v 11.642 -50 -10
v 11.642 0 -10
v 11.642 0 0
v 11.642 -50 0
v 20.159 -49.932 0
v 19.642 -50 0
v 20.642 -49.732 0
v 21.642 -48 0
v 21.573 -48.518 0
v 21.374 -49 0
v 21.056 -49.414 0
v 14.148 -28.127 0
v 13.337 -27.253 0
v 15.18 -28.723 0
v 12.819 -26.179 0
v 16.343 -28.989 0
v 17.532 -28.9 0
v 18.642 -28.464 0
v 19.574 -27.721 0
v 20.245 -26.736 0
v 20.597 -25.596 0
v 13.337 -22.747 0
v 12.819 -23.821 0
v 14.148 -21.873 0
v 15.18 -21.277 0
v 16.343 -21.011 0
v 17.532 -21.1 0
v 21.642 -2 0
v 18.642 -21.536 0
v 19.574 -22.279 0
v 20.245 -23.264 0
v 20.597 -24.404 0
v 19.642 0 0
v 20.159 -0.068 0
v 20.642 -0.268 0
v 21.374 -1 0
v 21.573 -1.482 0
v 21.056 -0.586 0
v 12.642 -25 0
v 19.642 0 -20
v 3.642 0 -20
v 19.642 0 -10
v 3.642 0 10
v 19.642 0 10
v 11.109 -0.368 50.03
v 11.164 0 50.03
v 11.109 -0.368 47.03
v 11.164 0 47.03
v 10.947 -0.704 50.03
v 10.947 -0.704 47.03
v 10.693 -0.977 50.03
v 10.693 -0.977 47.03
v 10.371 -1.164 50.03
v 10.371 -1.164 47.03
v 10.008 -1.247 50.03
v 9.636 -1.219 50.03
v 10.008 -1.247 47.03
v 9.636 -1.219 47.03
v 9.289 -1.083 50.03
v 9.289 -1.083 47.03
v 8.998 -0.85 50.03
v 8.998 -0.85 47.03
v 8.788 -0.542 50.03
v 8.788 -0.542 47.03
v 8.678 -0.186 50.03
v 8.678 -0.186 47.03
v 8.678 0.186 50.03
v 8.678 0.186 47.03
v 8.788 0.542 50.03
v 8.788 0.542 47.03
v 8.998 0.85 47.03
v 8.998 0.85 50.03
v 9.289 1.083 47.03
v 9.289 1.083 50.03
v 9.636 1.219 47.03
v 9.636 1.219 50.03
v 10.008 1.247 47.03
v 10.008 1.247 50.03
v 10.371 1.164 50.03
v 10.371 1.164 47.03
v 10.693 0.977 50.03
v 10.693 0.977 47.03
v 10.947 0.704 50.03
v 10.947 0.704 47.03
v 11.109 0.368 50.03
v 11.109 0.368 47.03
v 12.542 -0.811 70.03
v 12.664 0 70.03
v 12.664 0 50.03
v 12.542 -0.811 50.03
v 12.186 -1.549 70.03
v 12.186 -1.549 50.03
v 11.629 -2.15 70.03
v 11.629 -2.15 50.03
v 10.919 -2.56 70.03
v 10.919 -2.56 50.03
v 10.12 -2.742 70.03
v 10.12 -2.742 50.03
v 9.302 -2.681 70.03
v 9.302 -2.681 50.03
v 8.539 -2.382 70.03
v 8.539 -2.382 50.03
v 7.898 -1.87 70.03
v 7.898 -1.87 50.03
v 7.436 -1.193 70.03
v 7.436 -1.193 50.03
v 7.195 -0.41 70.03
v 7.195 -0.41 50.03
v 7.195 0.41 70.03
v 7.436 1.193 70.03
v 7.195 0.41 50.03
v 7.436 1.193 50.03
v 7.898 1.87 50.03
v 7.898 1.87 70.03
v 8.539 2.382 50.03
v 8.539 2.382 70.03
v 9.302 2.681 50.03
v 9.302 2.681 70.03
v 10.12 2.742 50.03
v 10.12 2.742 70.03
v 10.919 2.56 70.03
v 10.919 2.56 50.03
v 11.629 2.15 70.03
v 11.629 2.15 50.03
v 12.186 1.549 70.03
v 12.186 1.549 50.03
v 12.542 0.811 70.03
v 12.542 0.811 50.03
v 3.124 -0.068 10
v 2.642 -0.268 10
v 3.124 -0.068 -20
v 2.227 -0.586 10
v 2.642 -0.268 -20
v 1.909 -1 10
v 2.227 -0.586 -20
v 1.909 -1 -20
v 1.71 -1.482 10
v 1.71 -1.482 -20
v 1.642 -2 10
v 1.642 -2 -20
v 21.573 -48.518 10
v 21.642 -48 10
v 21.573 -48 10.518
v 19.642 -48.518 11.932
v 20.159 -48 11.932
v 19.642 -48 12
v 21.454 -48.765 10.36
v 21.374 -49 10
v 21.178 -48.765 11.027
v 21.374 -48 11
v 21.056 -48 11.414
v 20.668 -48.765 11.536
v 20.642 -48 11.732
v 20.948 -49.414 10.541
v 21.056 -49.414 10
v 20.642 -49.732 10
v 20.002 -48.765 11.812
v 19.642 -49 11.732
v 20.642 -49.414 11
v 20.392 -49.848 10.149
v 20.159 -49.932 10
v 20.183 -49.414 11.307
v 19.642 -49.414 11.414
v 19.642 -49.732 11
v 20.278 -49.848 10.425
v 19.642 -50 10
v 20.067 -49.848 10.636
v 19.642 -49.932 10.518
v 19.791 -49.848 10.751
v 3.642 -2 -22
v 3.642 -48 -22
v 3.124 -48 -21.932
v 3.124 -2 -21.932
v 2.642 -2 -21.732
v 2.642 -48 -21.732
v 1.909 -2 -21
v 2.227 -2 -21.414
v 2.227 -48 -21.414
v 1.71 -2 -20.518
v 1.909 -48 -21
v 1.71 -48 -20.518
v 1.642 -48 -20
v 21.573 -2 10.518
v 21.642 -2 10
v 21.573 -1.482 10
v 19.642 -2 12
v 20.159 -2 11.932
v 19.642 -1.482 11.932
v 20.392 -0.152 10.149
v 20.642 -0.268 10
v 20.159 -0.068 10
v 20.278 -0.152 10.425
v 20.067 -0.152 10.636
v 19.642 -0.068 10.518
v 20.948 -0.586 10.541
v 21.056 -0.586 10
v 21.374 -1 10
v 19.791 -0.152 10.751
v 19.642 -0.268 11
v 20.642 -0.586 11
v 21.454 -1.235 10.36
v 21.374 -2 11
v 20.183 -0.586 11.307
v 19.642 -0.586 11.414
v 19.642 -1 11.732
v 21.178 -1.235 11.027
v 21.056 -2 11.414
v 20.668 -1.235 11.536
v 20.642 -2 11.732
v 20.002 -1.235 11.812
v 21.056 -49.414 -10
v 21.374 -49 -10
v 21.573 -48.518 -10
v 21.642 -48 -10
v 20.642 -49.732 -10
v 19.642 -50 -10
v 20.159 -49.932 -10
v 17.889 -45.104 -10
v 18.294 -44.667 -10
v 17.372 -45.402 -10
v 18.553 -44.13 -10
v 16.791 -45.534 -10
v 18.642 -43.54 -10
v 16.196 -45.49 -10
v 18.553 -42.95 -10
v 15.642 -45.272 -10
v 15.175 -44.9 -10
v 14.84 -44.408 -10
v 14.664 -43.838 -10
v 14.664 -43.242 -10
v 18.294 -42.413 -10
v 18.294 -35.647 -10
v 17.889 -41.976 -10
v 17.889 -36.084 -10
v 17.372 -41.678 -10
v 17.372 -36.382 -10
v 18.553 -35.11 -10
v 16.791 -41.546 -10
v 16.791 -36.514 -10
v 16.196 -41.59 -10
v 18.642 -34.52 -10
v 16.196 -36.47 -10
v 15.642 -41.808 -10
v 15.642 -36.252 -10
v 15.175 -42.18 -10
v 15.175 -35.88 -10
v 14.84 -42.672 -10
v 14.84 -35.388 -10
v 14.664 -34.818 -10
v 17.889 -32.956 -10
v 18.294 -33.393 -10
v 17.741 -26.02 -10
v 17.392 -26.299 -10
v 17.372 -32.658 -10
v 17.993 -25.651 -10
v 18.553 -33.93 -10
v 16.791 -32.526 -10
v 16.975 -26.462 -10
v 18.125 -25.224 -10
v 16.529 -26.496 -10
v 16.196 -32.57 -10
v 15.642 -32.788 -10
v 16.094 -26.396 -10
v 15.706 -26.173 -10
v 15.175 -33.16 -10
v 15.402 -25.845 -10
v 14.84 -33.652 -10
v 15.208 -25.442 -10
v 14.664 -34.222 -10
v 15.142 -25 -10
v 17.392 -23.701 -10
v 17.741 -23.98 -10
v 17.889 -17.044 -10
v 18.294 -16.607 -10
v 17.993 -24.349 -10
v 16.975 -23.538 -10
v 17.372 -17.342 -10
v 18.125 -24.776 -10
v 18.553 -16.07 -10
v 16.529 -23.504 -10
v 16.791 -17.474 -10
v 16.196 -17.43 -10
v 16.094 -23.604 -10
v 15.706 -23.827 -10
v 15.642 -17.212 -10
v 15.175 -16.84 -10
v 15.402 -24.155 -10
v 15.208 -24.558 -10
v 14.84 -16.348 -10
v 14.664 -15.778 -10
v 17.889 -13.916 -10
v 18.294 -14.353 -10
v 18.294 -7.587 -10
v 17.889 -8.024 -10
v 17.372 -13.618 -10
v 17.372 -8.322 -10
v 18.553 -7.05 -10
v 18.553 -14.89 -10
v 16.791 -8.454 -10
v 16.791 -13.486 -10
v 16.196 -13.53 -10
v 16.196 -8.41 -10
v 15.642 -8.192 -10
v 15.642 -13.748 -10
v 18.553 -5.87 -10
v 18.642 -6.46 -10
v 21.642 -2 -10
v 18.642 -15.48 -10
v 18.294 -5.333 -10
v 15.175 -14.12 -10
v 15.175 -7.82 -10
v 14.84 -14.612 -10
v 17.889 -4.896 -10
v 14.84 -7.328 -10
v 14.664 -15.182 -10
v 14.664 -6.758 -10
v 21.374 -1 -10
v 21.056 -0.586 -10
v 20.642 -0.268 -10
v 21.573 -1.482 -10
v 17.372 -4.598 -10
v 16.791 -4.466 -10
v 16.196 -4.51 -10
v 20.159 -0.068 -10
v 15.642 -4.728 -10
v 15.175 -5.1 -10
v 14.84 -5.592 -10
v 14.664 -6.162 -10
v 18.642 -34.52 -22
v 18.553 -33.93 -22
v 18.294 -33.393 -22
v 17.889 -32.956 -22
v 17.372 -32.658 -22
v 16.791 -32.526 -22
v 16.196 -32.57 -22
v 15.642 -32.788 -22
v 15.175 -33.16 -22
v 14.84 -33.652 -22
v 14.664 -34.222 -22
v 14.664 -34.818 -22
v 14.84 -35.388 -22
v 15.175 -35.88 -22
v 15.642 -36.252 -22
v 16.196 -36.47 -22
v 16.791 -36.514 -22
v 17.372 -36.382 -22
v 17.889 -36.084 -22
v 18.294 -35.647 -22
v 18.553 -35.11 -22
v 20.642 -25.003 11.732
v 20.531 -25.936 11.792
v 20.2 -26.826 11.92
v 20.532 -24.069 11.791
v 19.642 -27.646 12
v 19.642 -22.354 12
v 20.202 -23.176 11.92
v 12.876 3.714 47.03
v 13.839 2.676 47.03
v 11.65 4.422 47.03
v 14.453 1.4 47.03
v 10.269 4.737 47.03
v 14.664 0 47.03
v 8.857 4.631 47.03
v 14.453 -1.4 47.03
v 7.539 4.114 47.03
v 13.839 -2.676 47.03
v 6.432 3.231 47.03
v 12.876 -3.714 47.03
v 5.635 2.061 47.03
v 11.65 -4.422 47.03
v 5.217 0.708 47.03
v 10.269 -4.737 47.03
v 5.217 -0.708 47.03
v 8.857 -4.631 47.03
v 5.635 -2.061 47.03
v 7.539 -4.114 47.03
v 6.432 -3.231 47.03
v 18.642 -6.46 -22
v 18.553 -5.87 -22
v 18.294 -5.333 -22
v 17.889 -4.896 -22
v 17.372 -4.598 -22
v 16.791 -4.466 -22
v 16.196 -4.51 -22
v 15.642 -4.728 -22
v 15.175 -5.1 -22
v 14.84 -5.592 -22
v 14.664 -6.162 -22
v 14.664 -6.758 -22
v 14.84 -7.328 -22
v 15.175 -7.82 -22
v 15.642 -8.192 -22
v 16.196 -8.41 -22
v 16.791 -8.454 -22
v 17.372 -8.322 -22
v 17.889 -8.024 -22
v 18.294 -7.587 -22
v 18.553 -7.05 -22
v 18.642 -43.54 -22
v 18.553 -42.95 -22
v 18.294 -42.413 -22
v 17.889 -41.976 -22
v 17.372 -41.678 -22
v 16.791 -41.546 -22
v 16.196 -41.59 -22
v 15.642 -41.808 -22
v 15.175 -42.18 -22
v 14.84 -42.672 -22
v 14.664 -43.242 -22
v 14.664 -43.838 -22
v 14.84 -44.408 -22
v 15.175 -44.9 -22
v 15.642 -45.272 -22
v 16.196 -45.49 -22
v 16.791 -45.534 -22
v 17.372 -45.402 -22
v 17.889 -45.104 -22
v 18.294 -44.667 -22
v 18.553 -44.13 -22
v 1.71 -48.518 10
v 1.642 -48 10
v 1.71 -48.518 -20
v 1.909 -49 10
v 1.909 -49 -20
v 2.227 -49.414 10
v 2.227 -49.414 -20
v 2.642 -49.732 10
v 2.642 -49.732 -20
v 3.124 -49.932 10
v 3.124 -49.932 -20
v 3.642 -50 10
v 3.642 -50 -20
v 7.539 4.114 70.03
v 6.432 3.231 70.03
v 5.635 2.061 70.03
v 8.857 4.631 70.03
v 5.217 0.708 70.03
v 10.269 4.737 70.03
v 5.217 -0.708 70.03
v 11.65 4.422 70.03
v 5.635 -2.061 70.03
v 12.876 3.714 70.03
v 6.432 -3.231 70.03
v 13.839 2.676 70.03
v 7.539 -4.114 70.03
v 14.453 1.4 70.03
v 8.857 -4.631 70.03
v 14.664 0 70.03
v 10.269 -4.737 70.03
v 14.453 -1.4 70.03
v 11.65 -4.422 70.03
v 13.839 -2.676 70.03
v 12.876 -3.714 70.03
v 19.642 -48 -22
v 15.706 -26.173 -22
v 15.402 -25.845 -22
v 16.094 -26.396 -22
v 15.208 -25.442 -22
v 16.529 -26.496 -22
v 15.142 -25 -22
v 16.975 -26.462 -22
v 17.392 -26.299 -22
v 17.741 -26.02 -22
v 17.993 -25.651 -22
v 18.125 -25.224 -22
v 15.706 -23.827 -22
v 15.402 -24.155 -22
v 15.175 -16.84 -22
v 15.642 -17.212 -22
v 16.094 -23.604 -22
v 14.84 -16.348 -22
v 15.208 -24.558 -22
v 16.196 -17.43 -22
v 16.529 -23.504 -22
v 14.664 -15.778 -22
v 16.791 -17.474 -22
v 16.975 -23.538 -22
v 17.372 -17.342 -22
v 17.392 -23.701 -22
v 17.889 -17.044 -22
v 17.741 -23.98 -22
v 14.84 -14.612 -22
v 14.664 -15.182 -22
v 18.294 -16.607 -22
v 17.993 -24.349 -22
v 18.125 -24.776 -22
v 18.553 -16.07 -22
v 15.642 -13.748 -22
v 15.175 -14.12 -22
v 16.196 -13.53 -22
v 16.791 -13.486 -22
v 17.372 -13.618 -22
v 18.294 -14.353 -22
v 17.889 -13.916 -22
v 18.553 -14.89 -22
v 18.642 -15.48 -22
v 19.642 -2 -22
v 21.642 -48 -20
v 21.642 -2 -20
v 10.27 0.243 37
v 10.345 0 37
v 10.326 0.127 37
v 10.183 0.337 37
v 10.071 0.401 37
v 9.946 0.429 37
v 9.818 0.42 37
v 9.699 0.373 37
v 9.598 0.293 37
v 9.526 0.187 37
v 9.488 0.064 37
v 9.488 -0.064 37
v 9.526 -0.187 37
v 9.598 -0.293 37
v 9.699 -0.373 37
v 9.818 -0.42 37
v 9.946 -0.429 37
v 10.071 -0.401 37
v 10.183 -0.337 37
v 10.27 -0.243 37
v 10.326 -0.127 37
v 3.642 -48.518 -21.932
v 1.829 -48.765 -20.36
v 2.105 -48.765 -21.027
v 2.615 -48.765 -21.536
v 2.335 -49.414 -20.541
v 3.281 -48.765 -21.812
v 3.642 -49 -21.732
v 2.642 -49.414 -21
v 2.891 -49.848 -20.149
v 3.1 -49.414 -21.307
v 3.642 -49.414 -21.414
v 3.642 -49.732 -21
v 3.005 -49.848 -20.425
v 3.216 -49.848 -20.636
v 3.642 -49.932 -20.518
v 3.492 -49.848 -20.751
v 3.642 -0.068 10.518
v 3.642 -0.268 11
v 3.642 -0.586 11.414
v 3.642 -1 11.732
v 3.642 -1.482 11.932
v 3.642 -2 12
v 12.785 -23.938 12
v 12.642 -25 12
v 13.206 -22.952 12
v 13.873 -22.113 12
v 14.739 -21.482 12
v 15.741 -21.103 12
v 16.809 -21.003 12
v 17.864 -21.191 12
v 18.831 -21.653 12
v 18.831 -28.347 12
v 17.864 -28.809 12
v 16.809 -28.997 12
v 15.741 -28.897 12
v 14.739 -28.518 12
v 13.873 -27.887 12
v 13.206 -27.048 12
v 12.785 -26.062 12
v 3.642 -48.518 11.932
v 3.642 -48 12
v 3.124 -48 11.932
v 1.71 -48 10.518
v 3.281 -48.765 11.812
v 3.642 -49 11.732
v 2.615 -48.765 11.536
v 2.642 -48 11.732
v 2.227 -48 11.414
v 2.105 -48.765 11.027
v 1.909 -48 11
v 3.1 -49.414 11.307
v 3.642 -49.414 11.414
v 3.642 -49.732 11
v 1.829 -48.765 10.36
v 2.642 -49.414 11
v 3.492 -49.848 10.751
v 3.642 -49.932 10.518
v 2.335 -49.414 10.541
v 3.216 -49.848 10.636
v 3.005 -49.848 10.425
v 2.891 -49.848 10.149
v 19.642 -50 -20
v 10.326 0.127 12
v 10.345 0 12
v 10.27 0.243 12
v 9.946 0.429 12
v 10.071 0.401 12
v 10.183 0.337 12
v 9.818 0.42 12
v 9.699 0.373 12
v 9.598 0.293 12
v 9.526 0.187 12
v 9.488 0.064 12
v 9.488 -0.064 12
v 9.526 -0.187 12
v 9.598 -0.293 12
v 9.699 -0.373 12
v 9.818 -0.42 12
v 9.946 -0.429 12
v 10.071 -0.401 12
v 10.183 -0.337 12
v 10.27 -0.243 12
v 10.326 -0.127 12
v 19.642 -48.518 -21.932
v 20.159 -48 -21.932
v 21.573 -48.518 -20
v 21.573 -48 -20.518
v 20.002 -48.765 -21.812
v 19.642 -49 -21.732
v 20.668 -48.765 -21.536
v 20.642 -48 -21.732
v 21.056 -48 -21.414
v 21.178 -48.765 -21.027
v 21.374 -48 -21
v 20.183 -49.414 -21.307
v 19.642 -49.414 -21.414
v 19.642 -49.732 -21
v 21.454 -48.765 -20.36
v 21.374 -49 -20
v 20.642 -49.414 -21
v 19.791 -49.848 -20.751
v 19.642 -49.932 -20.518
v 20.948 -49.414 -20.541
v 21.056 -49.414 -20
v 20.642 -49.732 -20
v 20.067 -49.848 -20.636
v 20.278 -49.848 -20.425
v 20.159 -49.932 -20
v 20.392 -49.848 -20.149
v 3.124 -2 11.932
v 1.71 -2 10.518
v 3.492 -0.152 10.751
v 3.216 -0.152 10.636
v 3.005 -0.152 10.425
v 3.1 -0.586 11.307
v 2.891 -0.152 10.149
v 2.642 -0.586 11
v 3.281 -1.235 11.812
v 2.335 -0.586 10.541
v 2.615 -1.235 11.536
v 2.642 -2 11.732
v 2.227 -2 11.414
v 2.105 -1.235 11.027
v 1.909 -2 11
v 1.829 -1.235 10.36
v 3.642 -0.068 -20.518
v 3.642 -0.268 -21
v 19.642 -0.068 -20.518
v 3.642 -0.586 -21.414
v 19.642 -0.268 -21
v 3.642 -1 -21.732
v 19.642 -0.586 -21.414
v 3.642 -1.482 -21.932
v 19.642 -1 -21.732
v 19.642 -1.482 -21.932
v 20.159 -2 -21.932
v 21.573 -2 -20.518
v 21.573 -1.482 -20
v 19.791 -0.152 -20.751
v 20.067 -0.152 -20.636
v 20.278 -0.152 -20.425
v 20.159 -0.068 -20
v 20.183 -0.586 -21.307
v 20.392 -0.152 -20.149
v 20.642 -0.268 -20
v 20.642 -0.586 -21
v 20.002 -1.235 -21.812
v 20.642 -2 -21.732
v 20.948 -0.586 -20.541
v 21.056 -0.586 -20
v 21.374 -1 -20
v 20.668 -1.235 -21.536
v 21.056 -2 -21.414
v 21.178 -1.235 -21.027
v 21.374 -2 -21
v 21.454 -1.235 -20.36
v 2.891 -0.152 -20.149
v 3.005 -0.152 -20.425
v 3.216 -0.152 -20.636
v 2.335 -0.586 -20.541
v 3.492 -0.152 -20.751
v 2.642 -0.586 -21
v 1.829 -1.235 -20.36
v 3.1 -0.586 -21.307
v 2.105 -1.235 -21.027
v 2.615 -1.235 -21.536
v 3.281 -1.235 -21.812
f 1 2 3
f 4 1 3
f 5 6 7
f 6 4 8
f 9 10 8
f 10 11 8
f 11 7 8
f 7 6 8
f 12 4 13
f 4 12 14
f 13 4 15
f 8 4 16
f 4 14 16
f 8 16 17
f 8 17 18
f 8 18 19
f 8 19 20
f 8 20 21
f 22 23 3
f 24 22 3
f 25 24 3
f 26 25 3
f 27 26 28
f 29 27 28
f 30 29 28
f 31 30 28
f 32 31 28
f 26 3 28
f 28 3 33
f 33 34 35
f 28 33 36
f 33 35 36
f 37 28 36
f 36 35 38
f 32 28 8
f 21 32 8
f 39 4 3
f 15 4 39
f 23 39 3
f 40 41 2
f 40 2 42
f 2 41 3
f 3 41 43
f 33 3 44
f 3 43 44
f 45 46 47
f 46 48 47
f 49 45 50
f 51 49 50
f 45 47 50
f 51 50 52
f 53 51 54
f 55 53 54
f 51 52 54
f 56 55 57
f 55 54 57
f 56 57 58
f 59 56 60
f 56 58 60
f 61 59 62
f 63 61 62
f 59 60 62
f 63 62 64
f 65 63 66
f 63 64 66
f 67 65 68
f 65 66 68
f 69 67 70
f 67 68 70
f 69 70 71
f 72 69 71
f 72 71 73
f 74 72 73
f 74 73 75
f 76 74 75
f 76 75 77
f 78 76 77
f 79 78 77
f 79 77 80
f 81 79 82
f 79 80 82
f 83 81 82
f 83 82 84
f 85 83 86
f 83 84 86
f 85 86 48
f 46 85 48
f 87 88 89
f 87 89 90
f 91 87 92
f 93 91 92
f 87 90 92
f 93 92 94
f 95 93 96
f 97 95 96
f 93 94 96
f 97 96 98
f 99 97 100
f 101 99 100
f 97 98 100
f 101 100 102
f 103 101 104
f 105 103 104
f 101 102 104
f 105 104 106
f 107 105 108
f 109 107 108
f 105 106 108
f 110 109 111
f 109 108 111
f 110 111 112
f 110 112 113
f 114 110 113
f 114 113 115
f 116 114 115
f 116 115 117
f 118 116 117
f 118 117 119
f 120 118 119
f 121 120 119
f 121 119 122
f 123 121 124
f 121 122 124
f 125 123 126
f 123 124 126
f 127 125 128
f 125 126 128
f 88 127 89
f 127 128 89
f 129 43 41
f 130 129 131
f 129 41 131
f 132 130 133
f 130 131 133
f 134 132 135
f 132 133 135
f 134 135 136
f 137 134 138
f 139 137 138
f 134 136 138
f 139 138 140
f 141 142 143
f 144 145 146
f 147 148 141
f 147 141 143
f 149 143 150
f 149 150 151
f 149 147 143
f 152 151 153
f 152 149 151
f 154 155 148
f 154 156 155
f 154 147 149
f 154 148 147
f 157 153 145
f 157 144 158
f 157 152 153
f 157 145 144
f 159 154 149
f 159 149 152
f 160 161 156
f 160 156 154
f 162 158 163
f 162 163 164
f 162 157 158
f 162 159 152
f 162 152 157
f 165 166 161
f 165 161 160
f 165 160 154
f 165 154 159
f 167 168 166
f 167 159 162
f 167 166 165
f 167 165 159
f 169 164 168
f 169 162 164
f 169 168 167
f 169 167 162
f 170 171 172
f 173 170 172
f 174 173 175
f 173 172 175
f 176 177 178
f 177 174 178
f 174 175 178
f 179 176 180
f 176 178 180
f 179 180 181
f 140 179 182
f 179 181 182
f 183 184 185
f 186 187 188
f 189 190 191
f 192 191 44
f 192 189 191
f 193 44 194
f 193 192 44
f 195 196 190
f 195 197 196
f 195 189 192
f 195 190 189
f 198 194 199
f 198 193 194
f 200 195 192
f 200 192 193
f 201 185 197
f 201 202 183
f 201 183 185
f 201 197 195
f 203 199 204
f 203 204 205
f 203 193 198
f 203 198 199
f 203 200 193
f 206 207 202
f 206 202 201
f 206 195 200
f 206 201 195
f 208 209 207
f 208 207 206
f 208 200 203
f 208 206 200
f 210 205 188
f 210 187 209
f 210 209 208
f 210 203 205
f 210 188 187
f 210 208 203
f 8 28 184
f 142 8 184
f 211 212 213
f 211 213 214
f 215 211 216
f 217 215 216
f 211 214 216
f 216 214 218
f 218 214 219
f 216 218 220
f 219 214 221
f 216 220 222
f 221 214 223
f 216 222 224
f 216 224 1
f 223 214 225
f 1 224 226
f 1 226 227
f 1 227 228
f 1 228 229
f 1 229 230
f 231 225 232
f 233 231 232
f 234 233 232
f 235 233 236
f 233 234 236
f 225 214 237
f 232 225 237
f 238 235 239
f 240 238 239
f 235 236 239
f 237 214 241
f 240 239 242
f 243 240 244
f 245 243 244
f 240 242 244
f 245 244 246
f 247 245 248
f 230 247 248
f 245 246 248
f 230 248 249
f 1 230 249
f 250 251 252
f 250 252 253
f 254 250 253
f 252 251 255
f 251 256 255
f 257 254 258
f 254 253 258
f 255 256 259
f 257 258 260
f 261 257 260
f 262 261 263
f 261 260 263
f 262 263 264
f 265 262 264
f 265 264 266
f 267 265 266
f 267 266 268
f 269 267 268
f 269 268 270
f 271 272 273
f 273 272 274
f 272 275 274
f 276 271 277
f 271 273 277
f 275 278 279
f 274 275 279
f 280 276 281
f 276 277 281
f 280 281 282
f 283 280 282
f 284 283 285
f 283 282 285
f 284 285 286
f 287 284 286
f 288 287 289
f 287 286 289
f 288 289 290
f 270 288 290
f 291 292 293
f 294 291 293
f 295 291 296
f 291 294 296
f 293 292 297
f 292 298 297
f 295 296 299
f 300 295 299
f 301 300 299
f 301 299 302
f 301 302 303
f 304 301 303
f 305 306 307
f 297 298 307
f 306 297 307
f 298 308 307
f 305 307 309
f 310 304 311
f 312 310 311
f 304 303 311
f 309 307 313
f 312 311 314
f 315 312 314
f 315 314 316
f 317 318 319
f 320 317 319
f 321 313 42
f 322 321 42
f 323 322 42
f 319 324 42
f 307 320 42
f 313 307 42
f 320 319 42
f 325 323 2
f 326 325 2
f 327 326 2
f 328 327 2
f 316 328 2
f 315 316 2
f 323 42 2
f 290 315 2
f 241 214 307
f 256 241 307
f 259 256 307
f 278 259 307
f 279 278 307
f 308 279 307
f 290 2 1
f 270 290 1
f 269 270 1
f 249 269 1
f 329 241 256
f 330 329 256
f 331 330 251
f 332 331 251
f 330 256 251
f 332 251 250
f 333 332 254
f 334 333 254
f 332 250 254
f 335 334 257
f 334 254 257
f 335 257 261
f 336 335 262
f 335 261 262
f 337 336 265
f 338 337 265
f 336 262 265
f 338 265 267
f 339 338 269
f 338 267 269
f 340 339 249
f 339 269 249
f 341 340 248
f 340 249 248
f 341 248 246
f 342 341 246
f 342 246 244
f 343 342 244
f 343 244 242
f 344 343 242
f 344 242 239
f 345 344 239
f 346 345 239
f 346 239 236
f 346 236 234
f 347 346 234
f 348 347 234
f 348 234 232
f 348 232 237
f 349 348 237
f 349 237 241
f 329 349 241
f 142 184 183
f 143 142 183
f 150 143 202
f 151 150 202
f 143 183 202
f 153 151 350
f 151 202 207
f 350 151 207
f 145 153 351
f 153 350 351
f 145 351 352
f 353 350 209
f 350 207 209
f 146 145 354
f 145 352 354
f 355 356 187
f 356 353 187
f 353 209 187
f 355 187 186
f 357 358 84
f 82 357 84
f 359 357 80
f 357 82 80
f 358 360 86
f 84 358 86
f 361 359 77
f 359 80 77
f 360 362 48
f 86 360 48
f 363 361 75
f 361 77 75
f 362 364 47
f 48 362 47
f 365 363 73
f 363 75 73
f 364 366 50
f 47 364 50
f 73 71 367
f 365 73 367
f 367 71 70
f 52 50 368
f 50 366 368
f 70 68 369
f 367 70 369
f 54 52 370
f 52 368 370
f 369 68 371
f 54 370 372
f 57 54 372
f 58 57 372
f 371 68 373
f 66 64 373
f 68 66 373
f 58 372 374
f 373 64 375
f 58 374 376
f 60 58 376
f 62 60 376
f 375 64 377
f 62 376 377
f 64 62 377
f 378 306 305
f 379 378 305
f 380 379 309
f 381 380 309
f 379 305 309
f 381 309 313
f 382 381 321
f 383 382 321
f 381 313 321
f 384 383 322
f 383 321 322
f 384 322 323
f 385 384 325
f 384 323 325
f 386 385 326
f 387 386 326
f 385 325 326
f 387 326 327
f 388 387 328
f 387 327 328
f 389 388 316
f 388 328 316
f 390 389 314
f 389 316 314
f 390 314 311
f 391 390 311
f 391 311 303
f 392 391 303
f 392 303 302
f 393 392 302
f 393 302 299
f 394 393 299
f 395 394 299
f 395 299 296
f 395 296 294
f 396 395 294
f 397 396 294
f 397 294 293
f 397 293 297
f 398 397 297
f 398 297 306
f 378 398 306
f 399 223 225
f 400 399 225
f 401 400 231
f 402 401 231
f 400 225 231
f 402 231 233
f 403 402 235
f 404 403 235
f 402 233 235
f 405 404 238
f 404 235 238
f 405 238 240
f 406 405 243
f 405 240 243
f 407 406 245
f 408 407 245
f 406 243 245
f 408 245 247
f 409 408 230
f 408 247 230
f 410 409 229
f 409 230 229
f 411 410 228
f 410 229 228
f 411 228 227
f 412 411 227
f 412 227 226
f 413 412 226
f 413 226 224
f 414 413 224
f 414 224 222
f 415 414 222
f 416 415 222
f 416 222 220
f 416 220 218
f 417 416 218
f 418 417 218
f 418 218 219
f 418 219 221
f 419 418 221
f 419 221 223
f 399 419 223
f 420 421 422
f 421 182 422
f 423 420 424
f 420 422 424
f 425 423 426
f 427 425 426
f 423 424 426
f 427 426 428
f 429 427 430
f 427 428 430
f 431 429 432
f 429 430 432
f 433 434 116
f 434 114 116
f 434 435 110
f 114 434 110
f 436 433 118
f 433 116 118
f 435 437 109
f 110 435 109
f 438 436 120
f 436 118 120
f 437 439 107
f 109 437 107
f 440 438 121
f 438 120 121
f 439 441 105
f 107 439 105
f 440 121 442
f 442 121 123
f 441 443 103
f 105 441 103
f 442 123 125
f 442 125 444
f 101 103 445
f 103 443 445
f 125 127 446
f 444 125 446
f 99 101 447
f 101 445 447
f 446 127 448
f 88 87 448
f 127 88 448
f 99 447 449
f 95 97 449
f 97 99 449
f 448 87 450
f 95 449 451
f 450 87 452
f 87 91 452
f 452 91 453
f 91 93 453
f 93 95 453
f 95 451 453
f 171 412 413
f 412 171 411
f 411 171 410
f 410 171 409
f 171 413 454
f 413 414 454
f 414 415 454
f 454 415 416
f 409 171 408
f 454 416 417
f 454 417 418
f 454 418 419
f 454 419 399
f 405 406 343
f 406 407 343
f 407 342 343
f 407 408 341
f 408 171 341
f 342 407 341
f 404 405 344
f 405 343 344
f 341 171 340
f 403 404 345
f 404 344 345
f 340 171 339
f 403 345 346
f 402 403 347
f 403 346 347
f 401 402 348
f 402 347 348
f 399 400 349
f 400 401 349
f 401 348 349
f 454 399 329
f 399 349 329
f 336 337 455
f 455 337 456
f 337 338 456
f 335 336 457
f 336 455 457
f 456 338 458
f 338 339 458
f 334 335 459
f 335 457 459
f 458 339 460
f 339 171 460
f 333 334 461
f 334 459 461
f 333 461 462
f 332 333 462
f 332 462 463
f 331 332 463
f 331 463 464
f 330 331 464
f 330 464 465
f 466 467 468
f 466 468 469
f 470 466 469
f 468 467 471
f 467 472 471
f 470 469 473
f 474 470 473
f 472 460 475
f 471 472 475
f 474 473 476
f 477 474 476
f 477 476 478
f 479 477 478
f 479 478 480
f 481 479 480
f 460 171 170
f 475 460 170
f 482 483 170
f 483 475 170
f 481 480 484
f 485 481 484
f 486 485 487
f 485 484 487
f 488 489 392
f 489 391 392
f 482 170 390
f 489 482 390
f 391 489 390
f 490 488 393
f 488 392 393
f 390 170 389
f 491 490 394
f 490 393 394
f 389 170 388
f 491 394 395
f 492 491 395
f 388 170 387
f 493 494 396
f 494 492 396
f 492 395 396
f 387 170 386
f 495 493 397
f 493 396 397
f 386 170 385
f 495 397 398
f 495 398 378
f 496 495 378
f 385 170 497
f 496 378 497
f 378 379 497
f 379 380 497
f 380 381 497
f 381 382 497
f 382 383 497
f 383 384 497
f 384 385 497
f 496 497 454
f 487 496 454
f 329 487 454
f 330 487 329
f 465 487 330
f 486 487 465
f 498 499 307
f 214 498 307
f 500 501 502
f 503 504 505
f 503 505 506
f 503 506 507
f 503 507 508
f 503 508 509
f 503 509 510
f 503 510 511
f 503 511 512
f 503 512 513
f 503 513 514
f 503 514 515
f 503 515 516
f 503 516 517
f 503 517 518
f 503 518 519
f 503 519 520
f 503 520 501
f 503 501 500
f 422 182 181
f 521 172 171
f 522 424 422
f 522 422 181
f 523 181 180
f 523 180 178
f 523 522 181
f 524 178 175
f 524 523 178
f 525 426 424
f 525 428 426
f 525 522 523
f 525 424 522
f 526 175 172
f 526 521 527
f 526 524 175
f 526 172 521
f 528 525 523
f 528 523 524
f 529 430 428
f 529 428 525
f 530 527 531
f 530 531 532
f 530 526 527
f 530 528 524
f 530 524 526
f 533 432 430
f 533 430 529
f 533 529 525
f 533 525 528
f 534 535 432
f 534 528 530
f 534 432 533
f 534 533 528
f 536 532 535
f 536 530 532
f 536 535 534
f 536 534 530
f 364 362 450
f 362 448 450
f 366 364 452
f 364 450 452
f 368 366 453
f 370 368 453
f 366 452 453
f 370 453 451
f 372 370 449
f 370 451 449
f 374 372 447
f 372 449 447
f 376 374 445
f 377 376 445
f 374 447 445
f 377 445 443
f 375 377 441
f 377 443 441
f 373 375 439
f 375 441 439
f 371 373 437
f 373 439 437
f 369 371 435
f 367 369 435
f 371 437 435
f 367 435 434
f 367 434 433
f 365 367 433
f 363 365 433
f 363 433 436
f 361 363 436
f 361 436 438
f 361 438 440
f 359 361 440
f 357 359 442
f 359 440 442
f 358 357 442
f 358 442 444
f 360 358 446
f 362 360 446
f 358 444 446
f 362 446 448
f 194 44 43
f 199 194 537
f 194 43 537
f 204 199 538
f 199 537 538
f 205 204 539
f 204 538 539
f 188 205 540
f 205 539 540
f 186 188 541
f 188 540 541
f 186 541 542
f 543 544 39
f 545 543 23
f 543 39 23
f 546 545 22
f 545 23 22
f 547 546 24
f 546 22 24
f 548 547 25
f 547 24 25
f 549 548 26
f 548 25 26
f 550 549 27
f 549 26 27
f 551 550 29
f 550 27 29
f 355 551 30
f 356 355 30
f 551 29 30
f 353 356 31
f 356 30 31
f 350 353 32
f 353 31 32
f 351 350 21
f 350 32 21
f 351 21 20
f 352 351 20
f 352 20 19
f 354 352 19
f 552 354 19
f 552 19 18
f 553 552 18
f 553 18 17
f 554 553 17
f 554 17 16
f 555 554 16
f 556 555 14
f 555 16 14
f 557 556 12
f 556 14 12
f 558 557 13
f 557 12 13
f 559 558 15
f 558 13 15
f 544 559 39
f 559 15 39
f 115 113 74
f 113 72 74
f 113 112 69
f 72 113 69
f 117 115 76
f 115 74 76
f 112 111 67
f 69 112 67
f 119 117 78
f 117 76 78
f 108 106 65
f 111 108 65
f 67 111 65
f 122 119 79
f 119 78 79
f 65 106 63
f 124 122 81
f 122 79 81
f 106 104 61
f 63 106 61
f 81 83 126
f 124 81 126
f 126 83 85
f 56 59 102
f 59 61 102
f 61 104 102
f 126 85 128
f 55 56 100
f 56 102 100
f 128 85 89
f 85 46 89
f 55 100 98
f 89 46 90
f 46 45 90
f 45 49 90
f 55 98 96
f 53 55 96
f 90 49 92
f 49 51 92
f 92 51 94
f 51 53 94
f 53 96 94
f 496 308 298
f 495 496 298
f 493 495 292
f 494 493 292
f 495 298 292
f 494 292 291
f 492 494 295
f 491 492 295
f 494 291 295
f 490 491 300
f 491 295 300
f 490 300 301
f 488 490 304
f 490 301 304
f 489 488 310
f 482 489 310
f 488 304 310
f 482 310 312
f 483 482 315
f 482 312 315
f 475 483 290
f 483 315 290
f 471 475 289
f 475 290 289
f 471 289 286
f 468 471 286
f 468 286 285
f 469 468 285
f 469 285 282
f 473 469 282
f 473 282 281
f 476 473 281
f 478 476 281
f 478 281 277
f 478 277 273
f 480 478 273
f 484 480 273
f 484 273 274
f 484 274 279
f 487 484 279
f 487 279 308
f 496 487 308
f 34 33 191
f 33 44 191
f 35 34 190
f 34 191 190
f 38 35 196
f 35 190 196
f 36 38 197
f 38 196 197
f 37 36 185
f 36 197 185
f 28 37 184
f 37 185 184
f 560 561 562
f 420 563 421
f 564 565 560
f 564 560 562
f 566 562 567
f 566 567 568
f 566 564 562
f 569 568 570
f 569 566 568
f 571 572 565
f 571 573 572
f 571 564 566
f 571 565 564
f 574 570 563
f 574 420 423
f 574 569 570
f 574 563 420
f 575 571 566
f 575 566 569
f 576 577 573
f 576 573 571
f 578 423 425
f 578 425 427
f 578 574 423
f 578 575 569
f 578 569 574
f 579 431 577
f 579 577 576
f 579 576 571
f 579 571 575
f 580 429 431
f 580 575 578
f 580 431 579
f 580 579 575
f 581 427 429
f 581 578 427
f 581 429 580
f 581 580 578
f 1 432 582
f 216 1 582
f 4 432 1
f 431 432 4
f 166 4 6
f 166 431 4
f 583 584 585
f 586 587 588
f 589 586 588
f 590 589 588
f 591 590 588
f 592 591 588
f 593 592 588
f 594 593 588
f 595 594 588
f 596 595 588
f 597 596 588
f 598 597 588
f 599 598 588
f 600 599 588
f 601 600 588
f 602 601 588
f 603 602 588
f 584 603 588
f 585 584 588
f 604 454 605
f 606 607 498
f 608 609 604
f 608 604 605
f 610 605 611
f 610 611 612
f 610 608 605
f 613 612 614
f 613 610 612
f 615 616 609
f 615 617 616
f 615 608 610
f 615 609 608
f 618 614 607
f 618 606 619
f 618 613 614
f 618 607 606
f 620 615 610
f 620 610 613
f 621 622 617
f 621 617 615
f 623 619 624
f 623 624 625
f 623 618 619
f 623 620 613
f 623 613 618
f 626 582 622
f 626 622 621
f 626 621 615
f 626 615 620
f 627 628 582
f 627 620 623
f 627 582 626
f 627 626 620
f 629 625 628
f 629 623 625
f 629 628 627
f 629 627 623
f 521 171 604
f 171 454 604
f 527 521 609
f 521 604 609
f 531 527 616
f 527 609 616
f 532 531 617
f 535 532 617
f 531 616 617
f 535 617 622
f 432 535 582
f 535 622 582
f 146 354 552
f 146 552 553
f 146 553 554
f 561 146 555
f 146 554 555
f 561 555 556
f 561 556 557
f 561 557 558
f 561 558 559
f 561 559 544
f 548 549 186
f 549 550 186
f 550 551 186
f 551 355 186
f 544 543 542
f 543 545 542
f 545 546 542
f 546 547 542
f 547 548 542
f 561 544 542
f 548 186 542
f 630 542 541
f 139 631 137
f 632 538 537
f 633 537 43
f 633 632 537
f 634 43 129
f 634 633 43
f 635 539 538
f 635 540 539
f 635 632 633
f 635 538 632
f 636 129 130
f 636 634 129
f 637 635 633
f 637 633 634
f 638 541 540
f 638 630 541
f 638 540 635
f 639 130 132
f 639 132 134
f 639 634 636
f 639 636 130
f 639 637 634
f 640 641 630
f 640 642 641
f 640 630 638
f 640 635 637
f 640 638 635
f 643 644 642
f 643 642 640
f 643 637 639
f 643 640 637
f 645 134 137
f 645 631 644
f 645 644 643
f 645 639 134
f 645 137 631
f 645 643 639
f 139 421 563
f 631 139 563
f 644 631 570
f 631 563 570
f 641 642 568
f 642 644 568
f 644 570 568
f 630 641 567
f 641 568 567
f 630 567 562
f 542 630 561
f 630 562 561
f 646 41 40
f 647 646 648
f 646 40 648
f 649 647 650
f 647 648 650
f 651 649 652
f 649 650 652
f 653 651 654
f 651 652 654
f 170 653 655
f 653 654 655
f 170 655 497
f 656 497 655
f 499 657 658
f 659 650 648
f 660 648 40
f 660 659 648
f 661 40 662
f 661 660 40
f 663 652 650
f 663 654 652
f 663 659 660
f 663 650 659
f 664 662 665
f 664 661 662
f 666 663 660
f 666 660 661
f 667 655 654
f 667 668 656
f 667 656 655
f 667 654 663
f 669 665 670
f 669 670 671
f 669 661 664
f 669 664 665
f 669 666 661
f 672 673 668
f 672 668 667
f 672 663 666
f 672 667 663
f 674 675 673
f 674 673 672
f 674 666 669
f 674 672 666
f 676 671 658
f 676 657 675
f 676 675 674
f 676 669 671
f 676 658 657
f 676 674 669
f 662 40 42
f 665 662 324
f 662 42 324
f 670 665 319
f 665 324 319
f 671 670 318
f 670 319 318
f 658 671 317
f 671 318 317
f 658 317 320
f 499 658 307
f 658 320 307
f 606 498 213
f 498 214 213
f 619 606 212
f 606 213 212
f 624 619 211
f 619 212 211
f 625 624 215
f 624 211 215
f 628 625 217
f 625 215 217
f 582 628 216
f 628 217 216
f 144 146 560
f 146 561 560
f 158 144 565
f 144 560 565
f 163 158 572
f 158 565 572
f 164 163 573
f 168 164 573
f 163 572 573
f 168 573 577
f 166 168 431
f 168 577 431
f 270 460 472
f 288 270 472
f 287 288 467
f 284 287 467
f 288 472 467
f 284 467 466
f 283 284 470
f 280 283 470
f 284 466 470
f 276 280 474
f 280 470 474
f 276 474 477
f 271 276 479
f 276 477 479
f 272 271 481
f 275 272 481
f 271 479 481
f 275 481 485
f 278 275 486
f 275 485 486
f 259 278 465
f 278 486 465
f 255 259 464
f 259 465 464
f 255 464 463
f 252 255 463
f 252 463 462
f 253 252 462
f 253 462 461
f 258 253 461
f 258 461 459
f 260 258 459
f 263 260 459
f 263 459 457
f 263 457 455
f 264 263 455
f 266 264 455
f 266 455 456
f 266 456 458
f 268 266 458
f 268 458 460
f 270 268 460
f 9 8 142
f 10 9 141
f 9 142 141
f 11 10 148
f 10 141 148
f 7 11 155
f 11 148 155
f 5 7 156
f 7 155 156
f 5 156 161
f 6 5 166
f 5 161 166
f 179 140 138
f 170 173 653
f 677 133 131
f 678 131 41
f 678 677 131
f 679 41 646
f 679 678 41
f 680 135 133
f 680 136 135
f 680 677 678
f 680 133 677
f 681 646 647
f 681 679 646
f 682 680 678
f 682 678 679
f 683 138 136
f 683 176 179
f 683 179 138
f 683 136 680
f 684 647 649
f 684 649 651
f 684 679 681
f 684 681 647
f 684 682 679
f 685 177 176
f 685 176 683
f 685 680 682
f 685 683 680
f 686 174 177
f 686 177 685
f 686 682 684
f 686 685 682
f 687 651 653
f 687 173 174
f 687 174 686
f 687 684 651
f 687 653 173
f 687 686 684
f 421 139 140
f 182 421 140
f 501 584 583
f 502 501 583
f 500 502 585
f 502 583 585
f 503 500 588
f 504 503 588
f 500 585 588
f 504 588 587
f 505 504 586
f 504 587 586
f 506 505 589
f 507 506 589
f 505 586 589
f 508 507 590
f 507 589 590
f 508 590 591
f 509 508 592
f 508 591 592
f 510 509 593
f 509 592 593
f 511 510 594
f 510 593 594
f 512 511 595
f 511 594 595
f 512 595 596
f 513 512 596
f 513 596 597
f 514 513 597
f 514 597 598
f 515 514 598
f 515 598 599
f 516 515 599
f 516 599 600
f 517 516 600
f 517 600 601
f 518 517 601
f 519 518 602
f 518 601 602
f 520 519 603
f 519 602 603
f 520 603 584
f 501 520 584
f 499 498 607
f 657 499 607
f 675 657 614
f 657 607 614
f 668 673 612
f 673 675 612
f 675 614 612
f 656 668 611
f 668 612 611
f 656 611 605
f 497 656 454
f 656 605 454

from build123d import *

# Parameters (mm, degrees)
F1_DEPTH     = 50
F3_D         = 8
F3_DEPTH     = 12
F3_TIP       = 2.4034424761
F5_D         = 3
F7_D         = 4
F7_DEPTH     = 12.001
F9_D         = 4
F9_DEPTH     = 12.001
F11_D        = 4
F11_DEPTH    = 12.001
F13_D        = 4
F13_DEPTH    = 12.001
F14_T1_DEPTH = 60
F15_R        = 2
F16_R        = 2
F17_R        = 2
F20_R        = 0.430653221
F21_DEPTH    = 25


# Not quite as in the source:
# - a fillet or chamfer that OpenCascade refuses, or shapes differently, is made with other operations: its cross-section is extruded or revolved along the edge and cut away or added


with BuildPart() as f1:
    # F0 (on Front) → F1 (new body)
    with BuildSketch(Plane.XZ):
        Polygon((21.6415318622, 12), (1.6415318622, 12), (1.6415318622, -22), (21.6415318622, -22), (21.6415318622, -10), (11.6415318622, -10), (11.6415318622, 0), (21.6415318622, 0), align=None)
    extrude(amount=F1_DEPTH)

    # F3
    with Locations(Plane.XY.offset(12)):
        with Locations((16.6415318622, -25)):
            Hole(F3_D / 2, depth=F3_DEPTH)
            with Locations((0, 0, -(F3_DEPTH + F3_TIP / 2))):  # 118° drill point
                Cone(0, F3_D / 2, F3_TIP, mode=Mode.SUBTRACT)

    # F5 (through all)
    with Locations(Plane.XY.offset(-10)):
        with Locations((16.6415318622, -25)):
            Hole(F5_D / 2)

    # F7 (through all, one way)
    with BuildSketch(Plane.XY.offset(-10)):
        with Locations((16.6415318622, -34.52)):
            Circle(F7_D / 2)
    extrude(amount=-F7_DEPTH, mode=Mode.SUBTRACT)

    # F9 (through all, one way)
    with BuildSketch(Plane.XY.offset(-10)):
        with Locations((16.6415318622, -15.48)):
            Circle(F9_D / 2)
    extrude(amount=-F9_DEPTH, mode=Mode.SUBTRACT)

    # F11 (through all, one way)
    with BuildSketch(Plane.XY.offset(-10)):
        with Locations((16.6415318622, -6.46)):
            Circle(F11_D / 2)
    extrude(amount=-F11_DEPTH, mode=Mode.SUBTRACT)

    # F13 (through all, one way)
    with BuildSketch(Plane.XY.offset(-10)):
        with Locations((16.6415318622, -43.54)):
            Circle(F13_D / 2)
    extrude(amount=-F13_DEPTH, mode=Mode.SUBTRACT)

    # F14: fillet of radius 2 on 1 edges, made by hand

    # F14_s2 → F14_t1 (cut)
    with BuildSketch(Plane.XZ.offset(-5)):
        with BuildLine():
            ThreePointArc((21.6415318622, 10), (21.0557454246, 11.4142135624), (19.6415318622, 12))
            Line((19.6415318622, 12), (21.6415318622, 12))
            Line((21.6415318622, 12), (21.6415318622, 10))
        make_face()
    extrude(amount=F14_T1_DEPTH, mode=Mode.SUBTRACT)

    # F15
    f15_edges = [f1.edges().sort_by_distance(p)[0] for p in [
        (21.641532, -25, -22),
    ]]
    fillet(f15_edges, radius=F15_R)

    # F16
    f16_edges = [f1.edges().sort_by_distance(p)[0] for p in [
        (1.641532, -25, 12),
        (1.641532, -25, -22),
    ]]
    fillet(f16_edges, radius=F16_R)

    # F17
    f17_edges = [f1.edges().sort_by_distance(p)[0] for p in [
        (11.641532, -50, -22),
        (1.641532, -50, -5),
        (11.641532, -50, 12),
        (11.641532, 0, 12),
        (1.641532, 0, -5),
        (11.641532, 0, -22),
        (2.227318, 0, -21.414214),
        (21.055745, 0, -21.414214),
        (21.641532, 0, -15),
        (2.227318, 0, 11.414214),
        (21.055745, 0, 11.414214),
        (21.641532, 0, 5),
        (2.227318, -50, -21.414214),
        (21.055745, -50, -21.414214),
        (21.641532, -50, -15),
        (2.227318, -50, 11.414214),
        (21.055745, -50, 11.414214),
        (21.641532, -50, 5),
    ]]
    fillet(f17_edges, radius=F17_R)


with BuildPart() as f21:
    # F20 (on face) → F21 (new body)
    with BuildSketch(Plane.XY.offset(12)):
        with Locations((9.9141315413, 0)):
            Circle(F20_R)
    extrude(amount=F21_DEPTH)


with BuildPart() as f22:
    # F18 (on Front) → F22 (revolve)
    with BuildSketch(Plane.XZ):
        Polygon((11.1641315413, 47.0304564509), (14.6641315413, 47.0304564509), (14.6641315413, 70.0304564509), (12.6641315413, 70.0304564509), (12.6641315413, 50.0304564509), (11.1641315413, 50.0304564509), align=None)
    revolve(axis=Axis((9.9141315413, 0, 12), (0, 0, -1)))


solid = Compound([f1.part, f21.part, f22.part])
